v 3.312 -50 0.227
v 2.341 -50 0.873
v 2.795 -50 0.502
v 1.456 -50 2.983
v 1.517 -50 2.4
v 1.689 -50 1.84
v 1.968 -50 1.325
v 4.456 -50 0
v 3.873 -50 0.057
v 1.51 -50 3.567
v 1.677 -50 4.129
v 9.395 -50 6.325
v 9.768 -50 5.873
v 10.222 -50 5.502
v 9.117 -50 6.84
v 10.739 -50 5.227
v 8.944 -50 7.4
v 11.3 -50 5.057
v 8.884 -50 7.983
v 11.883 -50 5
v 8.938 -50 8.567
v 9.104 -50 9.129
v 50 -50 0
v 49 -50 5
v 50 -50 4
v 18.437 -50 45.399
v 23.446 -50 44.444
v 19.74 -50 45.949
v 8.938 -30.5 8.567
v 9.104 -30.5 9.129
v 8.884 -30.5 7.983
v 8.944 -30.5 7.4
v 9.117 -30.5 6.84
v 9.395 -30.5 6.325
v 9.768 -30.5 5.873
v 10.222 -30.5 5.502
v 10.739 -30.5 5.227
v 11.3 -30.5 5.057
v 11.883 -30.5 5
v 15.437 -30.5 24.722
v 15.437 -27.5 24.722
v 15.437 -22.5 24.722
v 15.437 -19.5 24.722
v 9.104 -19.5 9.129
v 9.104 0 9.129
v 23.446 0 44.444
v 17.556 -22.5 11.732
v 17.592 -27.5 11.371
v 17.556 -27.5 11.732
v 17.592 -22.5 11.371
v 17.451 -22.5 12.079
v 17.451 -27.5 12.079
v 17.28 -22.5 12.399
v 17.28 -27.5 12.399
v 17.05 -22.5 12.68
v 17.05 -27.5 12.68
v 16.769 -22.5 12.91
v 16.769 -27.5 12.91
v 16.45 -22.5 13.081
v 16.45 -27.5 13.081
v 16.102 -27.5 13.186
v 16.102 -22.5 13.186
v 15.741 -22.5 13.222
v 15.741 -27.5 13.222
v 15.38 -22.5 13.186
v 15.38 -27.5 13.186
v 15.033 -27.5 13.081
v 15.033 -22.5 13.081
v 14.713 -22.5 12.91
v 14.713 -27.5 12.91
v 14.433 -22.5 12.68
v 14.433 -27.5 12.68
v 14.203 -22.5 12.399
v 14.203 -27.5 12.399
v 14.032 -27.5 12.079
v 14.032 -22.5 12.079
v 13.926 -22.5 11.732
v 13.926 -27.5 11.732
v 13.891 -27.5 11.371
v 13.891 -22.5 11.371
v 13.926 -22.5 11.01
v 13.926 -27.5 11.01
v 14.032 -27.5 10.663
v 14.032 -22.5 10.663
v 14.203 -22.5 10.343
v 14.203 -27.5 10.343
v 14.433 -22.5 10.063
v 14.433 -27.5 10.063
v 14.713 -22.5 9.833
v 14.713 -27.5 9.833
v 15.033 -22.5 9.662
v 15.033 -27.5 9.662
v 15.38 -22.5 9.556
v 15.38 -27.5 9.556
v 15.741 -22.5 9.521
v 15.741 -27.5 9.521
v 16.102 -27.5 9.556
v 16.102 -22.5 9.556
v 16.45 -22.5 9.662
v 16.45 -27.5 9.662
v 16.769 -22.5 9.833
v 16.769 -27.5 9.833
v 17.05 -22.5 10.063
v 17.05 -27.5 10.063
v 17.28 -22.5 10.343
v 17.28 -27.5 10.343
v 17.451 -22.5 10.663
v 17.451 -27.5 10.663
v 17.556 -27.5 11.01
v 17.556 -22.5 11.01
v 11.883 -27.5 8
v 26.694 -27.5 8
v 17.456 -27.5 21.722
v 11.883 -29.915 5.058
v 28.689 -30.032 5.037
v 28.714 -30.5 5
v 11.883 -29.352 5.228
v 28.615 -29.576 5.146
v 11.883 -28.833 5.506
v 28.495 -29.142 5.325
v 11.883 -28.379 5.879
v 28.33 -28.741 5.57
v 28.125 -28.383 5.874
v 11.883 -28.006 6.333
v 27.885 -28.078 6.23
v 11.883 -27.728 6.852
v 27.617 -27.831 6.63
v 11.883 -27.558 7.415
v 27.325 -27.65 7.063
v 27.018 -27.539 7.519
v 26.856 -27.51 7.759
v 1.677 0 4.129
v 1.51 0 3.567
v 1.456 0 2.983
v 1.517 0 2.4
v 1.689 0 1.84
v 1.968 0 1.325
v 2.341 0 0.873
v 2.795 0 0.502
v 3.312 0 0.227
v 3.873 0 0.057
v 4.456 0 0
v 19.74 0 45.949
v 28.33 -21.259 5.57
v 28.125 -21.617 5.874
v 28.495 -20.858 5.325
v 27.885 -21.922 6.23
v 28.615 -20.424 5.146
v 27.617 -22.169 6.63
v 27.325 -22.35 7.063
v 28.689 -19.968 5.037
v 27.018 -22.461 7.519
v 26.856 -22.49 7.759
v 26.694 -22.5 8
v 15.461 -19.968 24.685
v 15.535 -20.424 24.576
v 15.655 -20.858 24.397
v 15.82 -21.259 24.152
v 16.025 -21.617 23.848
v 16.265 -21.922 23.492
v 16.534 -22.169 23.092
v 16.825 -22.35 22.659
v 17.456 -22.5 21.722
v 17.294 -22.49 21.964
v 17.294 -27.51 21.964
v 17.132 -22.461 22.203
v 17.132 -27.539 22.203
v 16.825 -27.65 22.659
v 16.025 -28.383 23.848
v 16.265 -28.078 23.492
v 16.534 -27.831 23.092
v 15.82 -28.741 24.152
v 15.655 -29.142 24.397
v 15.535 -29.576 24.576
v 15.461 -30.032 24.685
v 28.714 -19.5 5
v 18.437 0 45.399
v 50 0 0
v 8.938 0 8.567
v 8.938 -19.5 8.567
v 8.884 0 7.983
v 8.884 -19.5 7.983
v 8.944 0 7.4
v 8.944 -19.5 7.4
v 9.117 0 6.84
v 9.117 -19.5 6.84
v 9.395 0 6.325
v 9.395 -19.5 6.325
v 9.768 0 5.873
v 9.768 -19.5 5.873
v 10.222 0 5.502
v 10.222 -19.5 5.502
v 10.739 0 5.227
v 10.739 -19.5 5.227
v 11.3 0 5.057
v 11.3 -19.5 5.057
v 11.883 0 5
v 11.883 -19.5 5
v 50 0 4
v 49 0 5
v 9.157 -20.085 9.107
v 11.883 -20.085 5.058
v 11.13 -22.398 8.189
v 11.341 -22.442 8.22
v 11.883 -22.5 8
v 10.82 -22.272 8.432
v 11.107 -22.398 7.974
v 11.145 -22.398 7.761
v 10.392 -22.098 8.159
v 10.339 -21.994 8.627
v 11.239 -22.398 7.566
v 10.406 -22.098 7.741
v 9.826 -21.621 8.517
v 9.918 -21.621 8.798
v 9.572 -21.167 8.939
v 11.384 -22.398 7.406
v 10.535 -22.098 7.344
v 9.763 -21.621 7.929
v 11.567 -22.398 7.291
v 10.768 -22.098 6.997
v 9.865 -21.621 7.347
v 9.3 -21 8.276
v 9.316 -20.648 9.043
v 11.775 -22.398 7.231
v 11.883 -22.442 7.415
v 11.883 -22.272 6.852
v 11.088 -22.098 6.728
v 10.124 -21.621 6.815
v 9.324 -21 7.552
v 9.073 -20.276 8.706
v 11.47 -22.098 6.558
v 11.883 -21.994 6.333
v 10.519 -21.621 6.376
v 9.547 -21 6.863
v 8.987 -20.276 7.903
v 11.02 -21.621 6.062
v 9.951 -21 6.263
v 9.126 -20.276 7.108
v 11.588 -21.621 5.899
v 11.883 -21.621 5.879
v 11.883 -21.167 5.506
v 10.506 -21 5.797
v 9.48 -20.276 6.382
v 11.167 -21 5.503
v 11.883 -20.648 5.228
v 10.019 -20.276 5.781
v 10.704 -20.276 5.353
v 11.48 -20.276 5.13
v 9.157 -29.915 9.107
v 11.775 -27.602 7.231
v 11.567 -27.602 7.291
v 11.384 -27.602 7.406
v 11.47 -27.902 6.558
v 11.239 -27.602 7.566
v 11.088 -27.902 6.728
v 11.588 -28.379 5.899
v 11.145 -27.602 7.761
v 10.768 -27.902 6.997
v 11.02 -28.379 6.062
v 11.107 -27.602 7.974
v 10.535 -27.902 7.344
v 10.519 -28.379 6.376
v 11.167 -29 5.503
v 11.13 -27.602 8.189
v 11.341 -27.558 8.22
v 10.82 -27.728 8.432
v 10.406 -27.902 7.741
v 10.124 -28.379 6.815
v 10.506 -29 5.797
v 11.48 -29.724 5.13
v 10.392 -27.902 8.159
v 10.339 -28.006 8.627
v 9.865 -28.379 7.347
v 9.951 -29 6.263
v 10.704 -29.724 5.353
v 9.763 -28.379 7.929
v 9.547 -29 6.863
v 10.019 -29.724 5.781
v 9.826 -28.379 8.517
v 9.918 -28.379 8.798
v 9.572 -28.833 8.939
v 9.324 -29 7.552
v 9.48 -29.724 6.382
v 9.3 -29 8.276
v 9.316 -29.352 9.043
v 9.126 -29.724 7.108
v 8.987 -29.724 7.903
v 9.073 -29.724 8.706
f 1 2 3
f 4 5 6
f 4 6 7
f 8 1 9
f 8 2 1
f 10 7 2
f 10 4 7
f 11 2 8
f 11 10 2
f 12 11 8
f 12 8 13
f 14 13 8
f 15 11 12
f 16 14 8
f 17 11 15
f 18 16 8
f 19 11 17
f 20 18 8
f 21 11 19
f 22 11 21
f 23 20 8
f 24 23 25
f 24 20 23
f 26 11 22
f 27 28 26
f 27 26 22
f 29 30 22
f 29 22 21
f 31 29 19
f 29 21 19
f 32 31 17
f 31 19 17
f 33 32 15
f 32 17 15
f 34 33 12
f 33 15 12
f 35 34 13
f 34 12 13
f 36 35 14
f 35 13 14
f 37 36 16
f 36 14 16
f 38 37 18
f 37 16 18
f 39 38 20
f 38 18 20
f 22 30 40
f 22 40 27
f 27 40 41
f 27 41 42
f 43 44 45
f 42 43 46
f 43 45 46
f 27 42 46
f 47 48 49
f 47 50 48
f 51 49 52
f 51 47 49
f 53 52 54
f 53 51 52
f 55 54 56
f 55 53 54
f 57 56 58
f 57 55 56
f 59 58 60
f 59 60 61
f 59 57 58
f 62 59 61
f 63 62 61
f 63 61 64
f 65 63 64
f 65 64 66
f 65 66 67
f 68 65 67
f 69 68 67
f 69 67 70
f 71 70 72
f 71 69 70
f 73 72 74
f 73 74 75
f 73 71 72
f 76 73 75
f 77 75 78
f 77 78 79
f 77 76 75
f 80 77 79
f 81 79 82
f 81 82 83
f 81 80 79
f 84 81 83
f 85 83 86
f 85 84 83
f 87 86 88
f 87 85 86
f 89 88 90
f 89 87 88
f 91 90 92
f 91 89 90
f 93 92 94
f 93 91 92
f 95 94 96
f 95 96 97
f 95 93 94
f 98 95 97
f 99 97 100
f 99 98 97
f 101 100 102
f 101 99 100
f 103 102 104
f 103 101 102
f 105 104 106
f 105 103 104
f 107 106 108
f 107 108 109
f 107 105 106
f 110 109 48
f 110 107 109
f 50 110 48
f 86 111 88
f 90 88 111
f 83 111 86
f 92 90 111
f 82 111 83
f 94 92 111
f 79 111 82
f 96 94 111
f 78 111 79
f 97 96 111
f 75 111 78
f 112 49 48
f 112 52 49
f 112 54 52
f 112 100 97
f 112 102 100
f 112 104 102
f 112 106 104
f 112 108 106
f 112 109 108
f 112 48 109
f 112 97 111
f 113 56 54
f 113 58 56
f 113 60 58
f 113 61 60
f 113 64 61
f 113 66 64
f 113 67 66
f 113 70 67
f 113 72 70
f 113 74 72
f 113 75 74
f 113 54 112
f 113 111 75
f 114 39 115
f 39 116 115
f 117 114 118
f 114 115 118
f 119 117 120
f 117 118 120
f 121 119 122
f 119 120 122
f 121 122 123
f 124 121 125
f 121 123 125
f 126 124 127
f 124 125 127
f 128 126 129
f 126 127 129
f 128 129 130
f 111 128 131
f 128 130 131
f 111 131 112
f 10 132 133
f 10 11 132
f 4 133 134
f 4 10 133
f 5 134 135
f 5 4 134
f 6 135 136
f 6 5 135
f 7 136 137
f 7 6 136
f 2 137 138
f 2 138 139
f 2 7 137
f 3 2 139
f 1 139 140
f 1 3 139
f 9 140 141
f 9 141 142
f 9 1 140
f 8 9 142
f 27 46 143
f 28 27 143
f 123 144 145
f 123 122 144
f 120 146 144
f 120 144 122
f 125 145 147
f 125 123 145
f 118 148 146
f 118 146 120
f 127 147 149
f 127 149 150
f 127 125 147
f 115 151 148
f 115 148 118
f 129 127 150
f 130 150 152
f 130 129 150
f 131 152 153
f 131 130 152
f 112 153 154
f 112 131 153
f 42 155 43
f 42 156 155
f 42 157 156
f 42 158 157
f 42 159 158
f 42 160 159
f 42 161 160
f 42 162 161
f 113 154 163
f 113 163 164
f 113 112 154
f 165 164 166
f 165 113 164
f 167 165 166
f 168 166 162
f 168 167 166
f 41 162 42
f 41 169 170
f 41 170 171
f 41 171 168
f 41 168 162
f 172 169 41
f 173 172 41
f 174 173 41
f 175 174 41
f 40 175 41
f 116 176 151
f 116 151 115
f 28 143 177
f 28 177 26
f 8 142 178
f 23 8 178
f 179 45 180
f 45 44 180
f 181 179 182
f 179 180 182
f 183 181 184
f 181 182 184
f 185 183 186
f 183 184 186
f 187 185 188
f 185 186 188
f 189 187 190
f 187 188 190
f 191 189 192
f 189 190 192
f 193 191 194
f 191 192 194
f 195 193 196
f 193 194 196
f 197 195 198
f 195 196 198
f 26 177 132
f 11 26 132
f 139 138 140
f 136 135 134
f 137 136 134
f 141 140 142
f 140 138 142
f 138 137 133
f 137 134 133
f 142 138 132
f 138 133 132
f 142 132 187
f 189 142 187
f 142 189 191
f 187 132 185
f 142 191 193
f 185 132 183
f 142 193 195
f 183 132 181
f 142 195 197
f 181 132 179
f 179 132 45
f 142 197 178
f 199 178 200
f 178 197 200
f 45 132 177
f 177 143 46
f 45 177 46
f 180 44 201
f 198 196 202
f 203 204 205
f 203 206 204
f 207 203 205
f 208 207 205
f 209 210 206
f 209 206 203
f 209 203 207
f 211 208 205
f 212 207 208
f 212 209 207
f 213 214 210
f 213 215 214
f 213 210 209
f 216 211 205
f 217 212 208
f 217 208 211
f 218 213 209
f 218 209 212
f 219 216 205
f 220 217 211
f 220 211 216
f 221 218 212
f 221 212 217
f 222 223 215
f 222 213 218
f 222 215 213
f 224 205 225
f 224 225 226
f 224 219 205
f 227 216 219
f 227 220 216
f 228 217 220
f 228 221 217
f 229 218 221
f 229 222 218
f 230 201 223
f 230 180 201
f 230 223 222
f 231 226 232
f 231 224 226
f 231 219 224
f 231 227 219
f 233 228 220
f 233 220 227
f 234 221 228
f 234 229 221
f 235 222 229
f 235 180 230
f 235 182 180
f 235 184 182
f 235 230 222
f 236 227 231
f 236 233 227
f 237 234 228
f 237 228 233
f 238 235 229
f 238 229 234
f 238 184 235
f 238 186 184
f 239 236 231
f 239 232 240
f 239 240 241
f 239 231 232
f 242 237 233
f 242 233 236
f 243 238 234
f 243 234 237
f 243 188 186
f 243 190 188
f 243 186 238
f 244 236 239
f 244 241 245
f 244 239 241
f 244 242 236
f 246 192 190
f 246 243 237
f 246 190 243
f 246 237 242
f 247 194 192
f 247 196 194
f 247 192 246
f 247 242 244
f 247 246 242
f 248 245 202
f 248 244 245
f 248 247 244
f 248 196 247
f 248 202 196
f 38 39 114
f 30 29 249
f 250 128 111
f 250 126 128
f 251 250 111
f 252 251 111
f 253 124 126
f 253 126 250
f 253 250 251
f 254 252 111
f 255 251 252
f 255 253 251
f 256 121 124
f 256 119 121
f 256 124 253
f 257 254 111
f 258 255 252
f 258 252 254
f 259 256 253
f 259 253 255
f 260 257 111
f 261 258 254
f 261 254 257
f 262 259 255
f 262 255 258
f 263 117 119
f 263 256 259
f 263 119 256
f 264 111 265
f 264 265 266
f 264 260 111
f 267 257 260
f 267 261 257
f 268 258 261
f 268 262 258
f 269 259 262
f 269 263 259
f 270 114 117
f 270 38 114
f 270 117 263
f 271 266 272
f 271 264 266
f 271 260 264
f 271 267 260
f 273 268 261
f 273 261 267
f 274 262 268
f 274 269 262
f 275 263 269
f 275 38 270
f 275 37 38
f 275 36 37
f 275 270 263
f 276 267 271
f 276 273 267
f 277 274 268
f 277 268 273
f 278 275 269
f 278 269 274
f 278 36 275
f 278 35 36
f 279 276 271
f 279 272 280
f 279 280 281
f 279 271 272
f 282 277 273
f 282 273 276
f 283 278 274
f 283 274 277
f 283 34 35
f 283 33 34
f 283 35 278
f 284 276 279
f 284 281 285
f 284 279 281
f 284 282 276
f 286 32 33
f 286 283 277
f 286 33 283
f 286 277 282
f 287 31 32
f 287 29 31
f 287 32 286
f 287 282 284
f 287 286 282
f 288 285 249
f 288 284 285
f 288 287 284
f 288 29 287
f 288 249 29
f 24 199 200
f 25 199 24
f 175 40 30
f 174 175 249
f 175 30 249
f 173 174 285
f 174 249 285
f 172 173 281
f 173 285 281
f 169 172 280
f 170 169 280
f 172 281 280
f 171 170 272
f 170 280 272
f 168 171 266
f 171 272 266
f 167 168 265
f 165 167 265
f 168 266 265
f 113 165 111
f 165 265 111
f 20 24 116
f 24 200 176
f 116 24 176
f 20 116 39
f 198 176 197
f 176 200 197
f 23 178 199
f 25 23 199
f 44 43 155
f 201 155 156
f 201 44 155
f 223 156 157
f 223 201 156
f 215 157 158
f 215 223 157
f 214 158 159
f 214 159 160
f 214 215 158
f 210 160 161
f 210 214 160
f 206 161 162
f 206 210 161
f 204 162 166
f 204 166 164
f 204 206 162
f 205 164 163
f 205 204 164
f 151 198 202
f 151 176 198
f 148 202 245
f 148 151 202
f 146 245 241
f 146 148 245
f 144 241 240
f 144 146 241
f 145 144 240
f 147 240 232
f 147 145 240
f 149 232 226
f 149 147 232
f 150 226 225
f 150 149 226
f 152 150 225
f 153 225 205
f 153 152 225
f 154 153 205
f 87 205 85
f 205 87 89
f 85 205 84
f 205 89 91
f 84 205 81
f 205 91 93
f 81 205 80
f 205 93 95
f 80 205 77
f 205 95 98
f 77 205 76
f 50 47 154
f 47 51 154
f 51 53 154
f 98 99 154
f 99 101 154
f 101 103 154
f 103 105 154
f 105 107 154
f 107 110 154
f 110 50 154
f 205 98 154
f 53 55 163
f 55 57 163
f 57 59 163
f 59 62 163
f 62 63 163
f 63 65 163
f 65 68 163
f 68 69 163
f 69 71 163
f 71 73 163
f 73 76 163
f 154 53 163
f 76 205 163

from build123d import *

# Parameters (mm, degrees)
F1_DEPTH = 50
F3_R     = 1.8504510886
F4_DEPTH = 2.5
F5_R     = 3
F6_SIZE  = 1


with BuildPart() as f1:
    # F0 (on Front) → F1 (new body)
    with BuildSketch(Plane.XZ):
        Polygon((18.8134295464, 46.3255314994), (0, 0), (50, 0), (50, 5), (7.427160285, 5), (23.4459826963, 44.4441885448), align=None)
    extrude(amount=F1_DEPTH)

    # F3 (on offset) → F4 (join, symmetric)
    with BuildSketch(Plane.XZ.offset(25)):
        Polygon((28.7135801425, 5), (15.4365714906, 24.7220942724), (7.427160285, 5), align=None)
        with Locations((15.7413743436, 11.3711580634)):
            Circle(F3_R, mode=Mode.SUBTRACT)
    extrude(amount=F4_DEPTH, both=True)

    # F5
    f5_edges = [f1.edges().sort_by_distance(p)[0] for p in [
        (0, -25, 0),
        (18.07037, -27.5, 5),
        (11.431866, -27.5, 14.861047),
        (11.431866, -22.5, 14.861047),
        (18.07037, -22.5, 5),
        (7.42716, -38.75, 5),
        (7.42716, -11.25, 5),
    ]]
    fillet(f5_edges, radius=F5_R)

    # F6
    f6_edges = [f1.edges().sort_by_distance(p)[0] for p in [
        (18.81343, -25, 46.325531),
        (50, -25, 5),
    ]]
    chamfer(f6_edges, length=F6_SIZE)


solid = f1.part
